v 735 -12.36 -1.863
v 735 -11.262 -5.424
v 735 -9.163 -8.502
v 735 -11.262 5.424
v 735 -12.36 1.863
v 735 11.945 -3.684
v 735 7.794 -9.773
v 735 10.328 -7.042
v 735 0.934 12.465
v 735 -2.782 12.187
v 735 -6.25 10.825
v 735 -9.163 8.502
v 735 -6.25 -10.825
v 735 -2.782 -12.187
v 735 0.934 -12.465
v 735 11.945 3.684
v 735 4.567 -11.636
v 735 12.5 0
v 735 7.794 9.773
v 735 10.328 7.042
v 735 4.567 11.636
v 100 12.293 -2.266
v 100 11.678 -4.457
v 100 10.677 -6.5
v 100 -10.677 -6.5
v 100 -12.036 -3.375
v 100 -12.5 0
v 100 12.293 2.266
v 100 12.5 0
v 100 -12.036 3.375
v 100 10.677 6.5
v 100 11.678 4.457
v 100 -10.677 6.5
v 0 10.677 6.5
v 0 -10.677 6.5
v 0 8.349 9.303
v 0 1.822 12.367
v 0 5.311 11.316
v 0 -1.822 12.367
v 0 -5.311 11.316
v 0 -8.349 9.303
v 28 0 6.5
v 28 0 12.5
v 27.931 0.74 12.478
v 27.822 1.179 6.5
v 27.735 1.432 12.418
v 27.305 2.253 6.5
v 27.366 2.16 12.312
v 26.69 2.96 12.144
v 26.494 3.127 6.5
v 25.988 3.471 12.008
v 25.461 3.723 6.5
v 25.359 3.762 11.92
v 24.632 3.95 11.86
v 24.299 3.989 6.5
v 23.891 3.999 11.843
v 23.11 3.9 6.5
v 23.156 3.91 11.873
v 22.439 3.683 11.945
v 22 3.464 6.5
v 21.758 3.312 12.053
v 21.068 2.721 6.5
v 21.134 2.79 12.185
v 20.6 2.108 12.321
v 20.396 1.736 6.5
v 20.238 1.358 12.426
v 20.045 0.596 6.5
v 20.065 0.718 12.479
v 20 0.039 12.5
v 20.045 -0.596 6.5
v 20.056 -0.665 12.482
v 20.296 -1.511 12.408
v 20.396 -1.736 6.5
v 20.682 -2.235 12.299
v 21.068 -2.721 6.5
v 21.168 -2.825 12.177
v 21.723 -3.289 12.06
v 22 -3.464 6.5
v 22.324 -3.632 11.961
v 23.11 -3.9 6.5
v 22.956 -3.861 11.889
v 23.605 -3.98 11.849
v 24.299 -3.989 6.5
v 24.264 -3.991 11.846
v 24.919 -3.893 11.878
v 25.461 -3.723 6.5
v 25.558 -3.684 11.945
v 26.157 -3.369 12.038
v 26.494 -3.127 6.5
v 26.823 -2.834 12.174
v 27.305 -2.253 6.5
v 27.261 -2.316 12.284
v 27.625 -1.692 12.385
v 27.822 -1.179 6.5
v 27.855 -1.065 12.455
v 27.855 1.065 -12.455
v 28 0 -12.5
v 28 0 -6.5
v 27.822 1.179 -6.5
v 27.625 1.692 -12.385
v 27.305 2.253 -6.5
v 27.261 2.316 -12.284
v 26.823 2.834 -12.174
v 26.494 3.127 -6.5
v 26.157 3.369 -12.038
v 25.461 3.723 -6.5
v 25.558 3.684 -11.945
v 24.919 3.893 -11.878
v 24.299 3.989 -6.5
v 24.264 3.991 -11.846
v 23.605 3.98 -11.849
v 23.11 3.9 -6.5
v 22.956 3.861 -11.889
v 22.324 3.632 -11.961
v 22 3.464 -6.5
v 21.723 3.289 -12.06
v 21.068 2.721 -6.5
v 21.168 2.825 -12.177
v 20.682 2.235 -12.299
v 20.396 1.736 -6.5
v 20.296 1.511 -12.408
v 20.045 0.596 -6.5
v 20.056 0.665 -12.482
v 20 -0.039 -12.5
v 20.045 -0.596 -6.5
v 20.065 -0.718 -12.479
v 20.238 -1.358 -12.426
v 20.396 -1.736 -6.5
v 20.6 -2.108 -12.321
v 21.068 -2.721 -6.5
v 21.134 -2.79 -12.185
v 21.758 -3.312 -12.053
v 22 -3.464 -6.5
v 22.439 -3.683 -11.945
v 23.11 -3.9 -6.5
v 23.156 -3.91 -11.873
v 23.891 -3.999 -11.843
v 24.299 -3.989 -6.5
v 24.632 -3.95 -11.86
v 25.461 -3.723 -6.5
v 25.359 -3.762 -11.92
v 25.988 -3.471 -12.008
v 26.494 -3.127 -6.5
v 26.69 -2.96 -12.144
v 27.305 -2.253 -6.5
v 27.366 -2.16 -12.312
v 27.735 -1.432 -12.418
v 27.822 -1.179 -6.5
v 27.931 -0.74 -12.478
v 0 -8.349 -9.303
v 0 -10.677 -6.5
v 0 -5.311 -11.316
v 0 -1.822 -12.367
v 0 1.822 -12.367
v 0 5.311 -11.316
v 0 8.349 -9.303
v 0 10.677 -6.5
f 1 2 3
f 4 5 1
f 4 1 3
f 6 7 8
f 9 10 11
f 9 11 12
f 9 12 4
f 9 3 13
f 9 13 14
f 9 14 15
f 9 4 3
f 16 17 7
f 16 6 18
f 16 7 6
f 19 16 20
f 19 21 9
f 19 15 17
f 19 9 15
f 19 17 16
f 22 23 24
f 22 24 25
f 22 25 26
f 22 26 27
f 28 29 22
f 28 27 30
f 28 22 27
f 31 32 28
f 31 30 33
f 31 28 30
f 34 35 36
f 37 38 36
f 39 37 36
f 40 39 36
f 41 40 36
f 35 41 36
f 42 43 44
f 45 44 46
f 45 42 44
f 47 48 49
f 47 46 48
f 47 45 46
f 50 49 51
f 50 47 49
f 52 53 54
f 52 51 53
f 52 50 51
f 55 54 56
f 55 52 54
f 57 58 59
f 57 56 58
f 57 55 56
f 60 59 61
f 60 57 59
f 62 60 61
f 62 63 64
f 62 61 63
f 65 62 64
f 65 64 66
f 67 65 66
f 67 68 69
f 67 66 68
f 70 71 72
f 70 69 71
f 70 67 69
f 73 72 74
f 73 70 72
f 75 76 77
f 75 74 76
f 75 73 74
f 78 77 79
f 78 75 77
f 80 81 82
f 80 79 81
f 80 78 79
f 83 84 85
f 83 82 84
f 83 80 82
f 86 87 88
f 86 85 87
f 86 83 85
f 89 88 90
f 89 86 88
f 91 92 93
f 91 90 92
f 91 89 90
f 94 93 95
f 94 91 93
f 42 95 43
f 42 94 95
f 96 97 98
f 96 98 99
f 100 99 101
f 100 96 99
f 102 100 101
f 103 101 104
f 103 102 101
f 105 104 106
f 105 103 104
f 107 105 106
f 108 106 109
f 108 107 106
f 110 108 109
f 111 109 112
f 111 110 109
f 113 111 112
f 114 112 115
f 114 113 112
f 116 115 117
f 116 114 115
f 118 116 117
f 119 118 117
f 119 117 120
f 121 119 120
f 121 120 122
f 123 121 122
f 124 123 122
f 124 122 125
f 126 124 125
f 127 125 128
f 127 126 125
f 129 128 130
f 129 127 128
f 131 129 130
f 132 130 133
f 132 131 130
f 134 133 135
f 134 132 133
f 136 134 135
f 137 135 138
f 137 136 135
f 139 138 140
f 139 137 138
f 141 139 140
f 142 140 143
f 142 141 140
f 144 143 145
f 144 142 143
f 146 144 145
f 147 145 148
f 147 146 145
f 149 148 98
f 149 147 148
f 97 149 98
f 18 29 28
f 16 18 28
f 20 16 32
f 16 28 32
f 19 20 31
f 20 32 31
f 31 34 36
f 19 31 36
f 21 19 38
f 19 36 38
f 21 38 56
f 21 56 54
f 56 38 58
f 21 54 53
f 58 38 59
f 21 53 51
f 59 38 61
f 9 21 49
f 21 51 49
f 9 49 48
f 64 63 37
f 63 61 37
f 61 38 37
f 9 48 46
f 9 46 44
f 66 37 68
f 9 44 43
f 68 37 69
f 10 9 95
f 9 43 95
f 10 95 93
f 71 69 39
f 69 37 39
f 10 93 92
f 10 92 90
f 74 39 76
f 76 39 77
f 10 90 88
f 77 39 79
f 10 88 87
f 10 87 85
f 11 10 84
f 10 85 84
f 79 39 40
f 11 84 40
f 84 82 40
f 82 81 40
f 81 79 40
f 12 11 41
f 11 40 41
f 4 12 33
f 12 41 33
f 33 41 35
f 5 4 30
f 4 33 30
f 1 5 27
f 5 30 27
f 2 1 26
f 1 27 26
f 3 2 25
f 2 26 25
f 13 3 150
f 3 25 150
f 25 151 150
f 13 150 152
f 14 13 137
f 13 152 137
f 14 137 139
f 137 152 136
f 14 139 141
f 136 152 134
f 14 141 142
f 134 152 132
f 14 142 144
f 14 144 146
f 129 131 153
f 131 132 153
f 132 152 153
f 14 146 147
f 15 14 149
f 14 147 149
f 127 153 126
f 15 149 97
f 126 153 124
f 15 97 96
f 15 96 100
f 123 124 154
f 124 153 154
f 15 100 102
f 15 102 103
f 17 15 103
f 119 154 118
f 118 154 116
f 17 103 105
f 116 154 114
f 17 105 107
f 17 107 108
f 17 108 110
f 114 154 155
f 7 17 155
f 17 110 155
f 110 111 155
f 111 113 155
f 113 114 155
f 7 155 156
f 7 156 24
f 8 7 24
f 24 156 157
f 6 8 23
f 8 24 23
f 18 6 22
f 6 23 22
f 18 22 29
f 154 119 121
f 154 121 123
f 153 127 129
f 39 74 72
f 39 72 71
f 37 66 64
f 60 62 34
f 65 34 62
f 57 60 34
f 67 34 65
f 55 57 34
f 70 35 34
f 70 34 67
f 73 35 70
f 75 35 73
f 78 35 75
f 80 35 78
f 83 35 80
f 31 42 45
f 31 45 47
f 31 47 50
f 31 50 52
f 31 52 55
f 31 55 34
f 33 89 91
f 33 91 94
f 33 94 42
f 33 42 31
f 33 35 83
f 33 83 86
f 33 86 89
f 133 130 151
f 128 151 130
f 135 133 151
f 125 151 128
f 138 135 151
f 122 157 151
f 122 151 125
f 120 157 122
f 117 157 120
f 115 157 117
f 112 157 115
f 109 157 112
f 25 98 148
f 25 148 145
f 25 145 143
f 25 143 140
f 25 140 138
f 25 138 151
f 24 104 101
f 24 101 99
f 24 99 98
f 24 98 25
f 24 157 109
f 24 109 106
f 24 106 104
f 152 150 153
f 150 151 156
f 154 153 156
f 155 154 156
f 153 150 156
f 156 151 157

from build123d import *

# Parameters (mm, degrees)
F0_R          = 12.5
F1_DEPTH      = 735
F2_R          = 4
F3_DEPTH      = 12.5
F3_DEPTH_BACK = 12.5
F4_W          = 100
F4_H          = 13
F5_DEPTH      = 25.4
F5_DEPTH_BACK = 25.4


with BuildPart() as f1:
    # F0 (on Right) → F1 (new body)
    with BuildSketch(Plane.YZ):
        Circle(F0_R)
    extrude(amount=F1_DEPTH)

    # F2 (on Top) → F3 (cut, two sides)
    with BuildSketch(Plane.XY) as f3_sk:
        with Locations((24, 0)):
            Circle(F2_R)
    extrude(amount=-F3_DEPTH, mode=Mode.SUBTRACT)
    extrude(f3_sk.sketch, amount=F3_DEPTH_BACK, mode=Mode.SUBTRACT)

    # F4 (on Front) → F5 (cut, two sides)
    with BuildSketch(Plane.XZ) as f5_sk:
        with Locations((50, 0)):
            Rectangle(F4_W, F4_H)
    extrude(amount=-F5_DEPTH, mode=Mode.SUBTRACT)
    extrude(f5_sk.sketch, amount=F5_DEPTH_BACK, mode=Mode.SUBTRACT)


solid = f1.part
